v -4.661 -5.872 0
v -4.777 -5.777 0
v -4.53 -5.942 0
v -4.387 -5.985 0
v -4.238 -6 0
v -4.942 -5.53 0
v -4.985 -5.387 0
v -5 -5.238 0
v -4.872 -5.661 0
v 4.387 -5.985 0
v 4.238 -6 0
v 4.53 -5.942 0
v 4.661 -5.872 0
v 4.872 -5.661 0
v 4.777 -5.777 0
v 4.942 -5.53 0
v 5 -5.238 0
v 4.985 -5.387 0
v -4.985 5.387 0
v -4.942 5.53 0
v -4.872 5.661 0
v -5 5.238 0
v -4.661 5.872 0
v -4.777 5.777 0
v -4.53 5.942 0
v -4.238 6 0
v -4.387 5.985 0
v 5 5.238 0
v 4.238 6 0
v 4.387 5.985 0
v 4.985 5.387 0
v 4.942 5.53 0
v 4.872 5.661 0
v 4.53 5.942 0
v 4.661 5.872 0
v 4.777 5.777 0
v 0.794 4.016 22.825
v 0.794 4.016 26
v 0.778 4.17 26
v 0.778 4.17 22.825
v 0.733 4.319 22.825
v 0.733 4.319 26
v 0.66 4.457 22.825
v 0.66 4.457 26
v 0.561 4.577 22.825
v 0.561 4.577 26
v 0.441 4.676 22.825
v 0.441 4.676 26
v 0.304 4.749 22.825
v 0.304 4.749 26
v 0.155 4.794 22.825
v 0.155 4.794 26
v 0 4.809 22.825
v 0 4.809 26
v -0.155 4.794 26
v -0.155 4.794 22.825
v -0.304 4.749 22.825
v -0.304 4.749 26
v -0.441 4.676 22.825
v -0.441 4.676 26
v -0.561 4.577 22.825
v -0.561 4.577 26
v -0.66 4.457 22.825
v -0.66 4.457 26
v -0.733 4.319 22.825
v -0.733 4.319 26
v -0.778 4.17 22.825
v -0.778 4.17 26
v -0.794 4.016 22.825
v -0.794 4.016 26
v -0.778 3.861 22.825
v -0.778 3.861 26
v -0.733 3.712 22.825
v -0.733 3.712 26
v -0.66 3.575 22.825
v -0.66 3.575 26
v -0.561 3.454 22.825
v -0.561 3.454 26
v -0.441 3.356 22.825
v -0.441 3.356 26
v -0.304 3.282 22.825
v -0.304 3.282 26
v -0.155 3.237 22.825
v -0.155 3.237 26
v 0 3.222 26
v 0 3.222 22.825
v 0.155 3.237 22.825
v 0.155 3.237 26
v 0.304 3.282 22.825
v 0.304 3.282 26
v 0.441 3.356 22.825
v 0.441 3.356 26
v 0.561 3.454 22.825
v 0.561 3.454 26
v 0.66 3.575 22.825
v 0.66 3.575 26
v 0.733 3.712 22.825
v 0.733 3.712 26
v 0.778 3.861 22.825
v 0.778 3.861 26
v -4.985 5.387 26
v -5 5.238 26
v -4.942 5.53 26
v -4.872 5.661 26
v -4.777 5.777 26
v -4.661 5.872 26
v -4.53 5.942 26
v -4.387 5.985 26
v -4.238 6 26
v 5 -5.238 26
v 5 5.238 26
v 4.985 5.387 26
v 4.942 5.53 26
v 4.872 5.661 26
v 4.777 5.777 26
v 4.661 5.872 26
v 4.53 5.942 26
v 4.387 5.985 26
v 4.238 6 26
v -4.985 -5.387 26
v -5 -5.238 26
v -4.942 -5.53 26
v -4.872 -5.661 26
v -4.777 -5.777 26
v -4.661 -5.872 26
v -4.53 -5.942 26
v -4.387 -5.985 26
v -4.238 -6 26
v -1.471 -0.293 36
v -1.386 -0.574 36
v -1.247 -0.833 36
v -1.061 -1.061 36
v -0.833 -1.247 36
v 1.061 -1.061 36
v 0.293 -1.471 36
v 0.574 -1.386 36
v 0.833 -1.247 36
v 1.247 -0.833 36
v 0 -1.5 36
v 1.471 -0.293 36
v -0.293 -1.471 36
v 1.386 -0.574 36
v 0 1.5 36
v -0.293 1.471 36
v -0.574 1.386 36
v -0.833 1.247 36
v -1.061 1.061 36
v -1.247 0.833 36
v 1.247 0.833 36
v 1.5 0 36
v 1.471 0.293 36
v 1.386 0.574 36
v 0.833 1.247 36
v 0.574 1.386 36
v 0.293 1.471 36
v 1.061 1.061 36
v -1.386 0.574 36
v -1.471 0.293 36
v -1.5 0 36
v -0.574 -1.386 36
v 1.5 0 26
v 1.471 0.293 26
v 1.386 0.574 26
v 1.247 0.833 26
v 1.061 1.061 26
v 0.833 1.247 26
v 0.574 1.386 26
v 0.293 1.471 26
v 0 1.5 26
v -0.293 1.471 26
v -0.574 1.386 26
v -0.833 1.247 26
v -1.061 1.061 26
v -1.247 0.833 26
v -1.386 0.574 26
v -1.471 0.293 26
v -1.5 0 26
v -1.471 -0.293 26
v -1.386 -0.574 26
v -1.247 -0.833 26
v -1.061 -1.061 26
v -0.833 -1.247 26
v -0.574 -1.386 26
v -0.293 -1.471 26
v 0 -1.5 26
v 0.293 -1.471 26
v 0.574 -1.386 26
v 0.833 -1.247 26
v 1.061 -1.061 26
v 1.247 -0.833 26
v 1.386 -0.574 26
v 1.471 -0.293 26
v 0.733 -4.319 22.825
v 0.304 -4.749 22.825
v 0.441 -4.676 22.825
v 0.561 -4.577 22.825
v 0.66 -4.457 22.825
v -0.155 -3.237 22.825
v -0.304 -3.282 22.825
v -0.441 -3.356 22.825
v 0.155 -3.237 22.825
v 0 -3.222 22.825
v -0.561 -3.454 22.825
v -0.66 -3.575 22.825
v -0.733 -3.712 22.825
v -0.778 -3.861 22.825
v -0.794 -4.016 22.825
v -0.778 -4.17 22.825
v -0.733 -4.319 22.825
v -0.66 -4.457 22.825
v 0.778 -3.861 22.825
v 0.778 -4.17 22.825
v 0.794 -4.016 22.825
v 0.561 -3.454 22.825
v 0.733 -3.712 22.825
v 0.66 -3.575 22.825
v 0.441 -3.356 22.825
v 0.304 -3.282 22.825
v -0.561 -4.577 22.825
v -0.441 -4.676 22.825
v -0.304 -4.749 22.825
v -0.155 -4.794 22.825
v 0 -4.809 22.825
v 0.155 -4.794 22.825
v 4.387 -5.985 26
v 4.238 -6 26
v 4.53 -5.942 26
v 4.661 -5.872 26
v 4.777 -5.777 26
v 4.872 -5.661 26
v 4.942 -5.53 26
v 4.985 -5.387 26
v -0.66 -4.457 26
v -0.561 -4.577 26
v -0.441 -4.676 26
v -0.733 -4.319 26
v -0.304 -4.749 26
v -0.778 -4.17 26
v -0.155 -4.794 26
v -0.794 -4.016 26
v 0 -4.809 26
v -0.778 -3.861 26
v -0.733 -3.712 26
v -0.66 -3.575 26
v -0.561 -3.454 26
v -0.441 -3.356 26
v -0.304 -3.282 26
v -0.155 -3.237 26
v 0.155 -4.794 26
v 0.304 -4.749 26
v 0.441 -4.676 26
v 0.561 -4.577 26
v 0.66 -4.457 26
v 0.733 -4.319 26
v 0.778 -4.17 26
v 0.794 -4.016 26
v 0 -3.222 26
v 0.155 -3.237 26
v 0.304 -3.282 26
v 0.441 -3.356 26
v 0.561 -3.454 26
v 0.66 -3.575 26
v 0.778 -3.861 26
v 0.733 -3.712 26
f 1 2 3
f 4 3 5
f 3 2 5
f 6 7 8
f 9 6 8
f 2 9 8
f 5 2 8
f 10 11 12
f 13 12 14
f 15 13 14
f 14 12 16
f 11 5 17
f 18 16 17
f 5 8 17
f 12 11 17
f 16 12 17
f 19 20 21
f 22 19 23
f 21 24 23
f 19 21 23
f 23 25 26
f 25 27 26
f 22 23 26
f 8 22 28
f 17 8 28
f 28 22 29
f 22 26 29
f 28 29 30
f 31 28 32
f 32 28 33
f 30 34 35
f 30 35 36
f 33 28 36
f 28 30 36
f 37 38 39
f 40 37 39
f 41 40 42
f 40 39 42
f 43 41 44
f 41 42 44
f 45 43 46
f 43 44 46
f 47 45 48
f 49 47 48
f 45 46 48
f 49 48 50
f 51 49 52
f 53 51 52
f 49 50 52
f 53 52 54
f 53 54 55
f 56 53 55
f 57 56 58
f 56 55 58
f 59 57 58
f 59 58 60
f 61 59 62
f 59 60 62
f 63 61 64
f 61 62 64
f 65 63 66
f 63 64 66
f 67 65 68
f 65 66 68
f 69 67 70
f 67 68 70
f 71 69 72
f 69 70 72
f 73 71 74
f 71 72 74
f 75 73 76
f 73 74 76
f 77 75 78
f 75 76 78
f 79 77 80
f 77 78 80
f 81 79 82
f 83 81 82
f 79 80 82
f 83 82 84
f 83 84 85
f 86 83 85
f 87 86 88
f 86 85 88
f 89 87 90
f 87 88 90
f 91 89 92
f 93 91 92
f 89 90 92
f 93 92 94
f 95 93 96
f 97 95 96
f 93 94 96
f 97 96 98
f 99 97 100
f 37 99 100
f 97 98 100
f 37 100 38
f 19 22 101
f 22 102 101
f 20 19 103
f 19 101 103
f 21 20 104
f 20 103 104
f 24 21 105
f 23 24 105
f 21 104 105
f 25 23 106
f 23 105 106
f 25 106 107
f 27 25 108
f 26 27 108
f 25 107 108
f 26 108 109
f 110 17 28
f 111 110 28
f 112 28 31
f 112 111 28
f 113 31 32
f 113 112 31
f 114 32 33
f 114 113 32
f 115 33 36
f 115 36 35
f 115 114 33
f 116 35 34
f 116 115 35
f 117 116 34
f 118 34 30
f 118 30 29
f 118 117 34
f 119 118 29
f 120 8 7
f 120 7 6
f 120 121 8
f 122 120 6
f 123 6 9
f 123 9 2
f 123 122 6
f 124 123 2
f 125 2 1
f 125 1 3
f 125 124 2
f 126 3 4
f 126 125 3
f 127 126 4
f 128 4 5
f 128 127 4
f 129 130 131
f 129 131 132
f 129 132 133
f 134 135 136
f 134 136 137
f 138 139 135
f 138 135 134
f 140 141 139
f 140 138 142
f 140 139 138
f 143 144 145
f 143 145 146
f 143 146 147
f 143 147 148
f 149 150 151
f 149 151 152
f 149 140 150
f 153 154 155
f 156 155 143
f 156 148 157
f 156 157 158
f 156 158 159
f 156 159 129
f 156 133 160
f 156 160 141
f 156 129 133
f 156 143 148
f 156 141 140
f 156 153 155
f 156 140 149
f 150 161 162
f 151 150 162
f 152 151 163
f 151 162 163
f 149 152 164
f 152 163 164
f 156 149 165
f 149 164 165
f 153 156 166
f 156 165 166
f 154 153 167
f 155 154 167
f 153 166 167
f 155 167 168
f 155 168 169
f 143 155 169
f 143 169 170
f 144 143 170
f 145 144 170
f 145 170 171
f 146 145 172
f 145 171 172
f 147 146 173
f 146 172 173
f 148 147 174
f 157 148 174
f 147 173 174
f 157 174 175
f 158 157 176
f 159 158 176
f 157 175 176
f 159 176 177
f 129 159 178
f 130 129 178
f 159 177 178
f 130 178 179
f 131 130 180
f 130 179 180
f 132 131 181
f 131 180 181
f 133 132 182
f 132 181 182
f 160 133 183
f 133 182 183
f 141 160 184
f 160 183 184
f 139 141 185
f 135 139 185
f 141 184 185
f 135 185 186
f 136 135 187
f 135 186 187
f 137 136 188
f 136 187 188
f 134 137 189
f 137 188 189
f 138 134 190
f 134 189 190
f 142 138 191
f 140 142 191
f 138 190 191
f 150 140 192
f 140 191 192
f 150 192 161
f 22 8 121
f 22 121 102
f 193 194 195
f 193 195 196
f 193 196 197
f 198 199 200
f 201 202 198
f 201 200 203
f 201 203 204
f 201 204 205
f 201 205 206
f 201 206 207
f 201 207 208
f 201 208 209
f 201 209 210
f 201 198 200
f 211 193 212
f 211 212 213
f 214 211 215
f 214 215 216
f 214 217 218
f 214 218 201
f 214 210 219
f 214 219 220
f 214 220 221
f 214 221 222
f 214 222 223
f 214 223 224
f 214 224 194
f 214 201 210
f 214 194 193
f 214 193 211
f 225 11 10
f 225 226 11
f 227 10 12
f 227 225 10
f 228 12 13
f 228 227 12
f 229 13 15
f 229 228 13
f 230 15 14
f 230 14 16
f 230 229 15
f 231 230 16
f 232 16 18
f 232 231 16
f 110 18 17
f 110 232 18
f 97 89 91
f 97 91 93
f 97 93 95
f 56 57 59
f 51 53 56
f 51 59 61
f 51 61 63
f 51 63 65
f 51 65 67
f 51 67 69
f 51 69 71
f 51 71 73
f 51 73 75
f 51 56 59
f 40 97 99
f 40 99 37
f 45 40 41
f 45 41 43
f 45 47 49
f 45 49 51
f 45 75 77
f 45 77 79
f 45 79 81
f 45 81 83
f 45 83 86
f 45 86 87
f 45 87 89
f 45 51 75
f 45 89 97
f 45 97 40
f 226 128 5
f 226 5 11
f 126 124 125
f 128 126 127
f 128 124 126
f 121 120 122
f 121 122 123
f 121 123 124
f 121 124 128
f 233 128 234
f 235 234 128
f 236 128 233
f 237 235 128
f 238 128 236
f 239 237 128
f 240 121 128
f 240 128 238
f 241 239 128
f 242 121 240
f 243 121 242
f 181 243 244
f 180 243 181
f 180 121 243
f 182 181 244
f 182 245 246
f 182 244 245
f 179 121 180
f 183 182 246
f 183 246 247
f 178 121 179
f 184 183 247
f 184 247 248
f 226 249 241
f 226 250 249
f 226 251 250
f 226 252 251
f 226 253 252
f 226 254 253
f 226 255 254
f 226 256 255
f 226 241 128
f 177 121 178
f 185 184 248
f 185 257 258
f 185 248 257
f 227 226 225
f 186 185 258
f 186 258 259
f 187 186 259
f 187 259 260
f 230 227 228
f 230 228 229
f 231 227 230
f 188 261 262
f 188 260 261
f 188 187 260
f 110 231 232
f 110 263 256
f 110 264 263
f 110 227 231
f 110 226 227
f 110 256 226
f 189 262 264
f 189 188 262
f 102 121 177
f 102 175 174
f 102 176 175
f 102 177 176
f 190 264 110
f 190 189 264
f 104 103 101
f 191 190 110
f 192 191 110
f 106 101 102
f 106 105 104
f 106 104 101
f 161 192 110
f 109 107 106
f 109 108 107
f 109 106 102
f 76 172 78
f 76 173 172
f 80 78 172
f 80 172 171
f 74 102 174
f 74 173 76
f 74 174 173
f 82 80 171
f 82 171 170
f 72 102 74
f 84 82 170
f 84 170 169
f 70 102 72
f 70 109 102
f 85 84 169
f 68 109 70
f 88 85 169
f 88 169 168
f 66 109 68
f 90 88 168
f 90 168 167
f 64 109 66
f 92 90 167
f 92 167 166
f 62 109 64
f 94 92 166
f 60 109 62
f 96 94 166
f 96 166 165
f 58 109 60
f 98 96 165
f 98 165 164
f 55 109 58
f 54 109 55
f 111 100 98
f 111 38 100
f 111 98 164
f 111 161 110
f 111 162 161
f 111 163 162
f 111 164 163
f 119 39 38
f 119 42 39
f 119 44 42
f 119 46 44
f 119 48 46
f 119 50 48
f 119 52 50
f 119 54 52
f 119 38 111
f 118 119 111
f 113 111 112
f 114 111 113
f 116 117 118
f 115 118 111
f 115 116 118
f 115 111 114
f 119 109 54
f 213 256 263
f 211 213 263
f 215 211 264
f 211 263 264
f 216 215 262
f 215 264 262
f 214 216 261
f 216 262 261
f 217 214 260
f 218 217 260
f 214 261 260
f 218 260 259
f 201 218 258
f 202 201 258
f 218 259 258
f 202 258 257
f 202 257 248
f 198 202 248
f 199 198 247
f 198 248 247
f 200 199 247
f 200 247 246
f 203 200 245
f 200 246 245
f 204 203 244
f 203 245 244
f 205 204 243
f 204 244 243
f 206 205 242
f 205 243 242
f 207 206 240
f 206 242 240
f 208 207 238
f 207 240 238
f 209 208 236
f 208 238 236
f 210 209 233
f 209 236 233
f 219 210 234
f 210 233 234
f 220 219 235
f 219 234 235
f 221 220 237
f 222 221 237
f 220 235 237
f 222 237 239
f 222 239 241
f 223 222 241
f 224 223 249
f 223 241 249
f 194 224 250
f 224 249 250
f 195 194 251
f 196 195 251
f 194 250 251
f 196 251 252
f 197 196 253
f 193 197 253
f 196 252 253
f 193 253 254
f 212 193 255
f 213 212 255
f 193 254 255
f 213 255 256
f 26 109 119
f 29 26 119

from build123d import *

# Parameters (mm, degrees)
F0_W     = 10
F0_H     = 12
F1_DEPTH = 26
F2_R     = 0.762
F3_R     = 1.5
F4_DEPTH = 10
F5_R     = 0.79375
F6_DEPTH = 3.175


with BuildPart() as f1:
    # F0 (on Top) → F1 (new body)
    with BuildSketch(Plane.XY):
        Rectangle(F0_W, F0_H)
    extrude(amount=F1_DEPTH)

    # F2
    f2_edges = [f1.edges().sort_by_distance(p)[0] for p in [
        (-5, -6, 13),
        (-5, 6, 13),
        (5, -6, 13),
        (5, 6, 13),
    ]]
    fillet(f2_edges, radius=F2_R)

    # F3 (on face) → F4 (join)
    with BuildSketch(Plane.XY.offset(26)):
        Circle(F3_R)
    extrude(amount=F4_DEPTH)

    # F5 (on face) → F6 (cut)
    with BuildSketch(Plane.XY.offset(26)):
        with Locations((0, 4.015625)):
            Circle(F5_R)
        with Locations((0, -4.015625)):
            Circle(F5_R)
    extrude(amount=-F6_DEPTH, mode=Mode.SUBTRACT)


solid = f1.part
